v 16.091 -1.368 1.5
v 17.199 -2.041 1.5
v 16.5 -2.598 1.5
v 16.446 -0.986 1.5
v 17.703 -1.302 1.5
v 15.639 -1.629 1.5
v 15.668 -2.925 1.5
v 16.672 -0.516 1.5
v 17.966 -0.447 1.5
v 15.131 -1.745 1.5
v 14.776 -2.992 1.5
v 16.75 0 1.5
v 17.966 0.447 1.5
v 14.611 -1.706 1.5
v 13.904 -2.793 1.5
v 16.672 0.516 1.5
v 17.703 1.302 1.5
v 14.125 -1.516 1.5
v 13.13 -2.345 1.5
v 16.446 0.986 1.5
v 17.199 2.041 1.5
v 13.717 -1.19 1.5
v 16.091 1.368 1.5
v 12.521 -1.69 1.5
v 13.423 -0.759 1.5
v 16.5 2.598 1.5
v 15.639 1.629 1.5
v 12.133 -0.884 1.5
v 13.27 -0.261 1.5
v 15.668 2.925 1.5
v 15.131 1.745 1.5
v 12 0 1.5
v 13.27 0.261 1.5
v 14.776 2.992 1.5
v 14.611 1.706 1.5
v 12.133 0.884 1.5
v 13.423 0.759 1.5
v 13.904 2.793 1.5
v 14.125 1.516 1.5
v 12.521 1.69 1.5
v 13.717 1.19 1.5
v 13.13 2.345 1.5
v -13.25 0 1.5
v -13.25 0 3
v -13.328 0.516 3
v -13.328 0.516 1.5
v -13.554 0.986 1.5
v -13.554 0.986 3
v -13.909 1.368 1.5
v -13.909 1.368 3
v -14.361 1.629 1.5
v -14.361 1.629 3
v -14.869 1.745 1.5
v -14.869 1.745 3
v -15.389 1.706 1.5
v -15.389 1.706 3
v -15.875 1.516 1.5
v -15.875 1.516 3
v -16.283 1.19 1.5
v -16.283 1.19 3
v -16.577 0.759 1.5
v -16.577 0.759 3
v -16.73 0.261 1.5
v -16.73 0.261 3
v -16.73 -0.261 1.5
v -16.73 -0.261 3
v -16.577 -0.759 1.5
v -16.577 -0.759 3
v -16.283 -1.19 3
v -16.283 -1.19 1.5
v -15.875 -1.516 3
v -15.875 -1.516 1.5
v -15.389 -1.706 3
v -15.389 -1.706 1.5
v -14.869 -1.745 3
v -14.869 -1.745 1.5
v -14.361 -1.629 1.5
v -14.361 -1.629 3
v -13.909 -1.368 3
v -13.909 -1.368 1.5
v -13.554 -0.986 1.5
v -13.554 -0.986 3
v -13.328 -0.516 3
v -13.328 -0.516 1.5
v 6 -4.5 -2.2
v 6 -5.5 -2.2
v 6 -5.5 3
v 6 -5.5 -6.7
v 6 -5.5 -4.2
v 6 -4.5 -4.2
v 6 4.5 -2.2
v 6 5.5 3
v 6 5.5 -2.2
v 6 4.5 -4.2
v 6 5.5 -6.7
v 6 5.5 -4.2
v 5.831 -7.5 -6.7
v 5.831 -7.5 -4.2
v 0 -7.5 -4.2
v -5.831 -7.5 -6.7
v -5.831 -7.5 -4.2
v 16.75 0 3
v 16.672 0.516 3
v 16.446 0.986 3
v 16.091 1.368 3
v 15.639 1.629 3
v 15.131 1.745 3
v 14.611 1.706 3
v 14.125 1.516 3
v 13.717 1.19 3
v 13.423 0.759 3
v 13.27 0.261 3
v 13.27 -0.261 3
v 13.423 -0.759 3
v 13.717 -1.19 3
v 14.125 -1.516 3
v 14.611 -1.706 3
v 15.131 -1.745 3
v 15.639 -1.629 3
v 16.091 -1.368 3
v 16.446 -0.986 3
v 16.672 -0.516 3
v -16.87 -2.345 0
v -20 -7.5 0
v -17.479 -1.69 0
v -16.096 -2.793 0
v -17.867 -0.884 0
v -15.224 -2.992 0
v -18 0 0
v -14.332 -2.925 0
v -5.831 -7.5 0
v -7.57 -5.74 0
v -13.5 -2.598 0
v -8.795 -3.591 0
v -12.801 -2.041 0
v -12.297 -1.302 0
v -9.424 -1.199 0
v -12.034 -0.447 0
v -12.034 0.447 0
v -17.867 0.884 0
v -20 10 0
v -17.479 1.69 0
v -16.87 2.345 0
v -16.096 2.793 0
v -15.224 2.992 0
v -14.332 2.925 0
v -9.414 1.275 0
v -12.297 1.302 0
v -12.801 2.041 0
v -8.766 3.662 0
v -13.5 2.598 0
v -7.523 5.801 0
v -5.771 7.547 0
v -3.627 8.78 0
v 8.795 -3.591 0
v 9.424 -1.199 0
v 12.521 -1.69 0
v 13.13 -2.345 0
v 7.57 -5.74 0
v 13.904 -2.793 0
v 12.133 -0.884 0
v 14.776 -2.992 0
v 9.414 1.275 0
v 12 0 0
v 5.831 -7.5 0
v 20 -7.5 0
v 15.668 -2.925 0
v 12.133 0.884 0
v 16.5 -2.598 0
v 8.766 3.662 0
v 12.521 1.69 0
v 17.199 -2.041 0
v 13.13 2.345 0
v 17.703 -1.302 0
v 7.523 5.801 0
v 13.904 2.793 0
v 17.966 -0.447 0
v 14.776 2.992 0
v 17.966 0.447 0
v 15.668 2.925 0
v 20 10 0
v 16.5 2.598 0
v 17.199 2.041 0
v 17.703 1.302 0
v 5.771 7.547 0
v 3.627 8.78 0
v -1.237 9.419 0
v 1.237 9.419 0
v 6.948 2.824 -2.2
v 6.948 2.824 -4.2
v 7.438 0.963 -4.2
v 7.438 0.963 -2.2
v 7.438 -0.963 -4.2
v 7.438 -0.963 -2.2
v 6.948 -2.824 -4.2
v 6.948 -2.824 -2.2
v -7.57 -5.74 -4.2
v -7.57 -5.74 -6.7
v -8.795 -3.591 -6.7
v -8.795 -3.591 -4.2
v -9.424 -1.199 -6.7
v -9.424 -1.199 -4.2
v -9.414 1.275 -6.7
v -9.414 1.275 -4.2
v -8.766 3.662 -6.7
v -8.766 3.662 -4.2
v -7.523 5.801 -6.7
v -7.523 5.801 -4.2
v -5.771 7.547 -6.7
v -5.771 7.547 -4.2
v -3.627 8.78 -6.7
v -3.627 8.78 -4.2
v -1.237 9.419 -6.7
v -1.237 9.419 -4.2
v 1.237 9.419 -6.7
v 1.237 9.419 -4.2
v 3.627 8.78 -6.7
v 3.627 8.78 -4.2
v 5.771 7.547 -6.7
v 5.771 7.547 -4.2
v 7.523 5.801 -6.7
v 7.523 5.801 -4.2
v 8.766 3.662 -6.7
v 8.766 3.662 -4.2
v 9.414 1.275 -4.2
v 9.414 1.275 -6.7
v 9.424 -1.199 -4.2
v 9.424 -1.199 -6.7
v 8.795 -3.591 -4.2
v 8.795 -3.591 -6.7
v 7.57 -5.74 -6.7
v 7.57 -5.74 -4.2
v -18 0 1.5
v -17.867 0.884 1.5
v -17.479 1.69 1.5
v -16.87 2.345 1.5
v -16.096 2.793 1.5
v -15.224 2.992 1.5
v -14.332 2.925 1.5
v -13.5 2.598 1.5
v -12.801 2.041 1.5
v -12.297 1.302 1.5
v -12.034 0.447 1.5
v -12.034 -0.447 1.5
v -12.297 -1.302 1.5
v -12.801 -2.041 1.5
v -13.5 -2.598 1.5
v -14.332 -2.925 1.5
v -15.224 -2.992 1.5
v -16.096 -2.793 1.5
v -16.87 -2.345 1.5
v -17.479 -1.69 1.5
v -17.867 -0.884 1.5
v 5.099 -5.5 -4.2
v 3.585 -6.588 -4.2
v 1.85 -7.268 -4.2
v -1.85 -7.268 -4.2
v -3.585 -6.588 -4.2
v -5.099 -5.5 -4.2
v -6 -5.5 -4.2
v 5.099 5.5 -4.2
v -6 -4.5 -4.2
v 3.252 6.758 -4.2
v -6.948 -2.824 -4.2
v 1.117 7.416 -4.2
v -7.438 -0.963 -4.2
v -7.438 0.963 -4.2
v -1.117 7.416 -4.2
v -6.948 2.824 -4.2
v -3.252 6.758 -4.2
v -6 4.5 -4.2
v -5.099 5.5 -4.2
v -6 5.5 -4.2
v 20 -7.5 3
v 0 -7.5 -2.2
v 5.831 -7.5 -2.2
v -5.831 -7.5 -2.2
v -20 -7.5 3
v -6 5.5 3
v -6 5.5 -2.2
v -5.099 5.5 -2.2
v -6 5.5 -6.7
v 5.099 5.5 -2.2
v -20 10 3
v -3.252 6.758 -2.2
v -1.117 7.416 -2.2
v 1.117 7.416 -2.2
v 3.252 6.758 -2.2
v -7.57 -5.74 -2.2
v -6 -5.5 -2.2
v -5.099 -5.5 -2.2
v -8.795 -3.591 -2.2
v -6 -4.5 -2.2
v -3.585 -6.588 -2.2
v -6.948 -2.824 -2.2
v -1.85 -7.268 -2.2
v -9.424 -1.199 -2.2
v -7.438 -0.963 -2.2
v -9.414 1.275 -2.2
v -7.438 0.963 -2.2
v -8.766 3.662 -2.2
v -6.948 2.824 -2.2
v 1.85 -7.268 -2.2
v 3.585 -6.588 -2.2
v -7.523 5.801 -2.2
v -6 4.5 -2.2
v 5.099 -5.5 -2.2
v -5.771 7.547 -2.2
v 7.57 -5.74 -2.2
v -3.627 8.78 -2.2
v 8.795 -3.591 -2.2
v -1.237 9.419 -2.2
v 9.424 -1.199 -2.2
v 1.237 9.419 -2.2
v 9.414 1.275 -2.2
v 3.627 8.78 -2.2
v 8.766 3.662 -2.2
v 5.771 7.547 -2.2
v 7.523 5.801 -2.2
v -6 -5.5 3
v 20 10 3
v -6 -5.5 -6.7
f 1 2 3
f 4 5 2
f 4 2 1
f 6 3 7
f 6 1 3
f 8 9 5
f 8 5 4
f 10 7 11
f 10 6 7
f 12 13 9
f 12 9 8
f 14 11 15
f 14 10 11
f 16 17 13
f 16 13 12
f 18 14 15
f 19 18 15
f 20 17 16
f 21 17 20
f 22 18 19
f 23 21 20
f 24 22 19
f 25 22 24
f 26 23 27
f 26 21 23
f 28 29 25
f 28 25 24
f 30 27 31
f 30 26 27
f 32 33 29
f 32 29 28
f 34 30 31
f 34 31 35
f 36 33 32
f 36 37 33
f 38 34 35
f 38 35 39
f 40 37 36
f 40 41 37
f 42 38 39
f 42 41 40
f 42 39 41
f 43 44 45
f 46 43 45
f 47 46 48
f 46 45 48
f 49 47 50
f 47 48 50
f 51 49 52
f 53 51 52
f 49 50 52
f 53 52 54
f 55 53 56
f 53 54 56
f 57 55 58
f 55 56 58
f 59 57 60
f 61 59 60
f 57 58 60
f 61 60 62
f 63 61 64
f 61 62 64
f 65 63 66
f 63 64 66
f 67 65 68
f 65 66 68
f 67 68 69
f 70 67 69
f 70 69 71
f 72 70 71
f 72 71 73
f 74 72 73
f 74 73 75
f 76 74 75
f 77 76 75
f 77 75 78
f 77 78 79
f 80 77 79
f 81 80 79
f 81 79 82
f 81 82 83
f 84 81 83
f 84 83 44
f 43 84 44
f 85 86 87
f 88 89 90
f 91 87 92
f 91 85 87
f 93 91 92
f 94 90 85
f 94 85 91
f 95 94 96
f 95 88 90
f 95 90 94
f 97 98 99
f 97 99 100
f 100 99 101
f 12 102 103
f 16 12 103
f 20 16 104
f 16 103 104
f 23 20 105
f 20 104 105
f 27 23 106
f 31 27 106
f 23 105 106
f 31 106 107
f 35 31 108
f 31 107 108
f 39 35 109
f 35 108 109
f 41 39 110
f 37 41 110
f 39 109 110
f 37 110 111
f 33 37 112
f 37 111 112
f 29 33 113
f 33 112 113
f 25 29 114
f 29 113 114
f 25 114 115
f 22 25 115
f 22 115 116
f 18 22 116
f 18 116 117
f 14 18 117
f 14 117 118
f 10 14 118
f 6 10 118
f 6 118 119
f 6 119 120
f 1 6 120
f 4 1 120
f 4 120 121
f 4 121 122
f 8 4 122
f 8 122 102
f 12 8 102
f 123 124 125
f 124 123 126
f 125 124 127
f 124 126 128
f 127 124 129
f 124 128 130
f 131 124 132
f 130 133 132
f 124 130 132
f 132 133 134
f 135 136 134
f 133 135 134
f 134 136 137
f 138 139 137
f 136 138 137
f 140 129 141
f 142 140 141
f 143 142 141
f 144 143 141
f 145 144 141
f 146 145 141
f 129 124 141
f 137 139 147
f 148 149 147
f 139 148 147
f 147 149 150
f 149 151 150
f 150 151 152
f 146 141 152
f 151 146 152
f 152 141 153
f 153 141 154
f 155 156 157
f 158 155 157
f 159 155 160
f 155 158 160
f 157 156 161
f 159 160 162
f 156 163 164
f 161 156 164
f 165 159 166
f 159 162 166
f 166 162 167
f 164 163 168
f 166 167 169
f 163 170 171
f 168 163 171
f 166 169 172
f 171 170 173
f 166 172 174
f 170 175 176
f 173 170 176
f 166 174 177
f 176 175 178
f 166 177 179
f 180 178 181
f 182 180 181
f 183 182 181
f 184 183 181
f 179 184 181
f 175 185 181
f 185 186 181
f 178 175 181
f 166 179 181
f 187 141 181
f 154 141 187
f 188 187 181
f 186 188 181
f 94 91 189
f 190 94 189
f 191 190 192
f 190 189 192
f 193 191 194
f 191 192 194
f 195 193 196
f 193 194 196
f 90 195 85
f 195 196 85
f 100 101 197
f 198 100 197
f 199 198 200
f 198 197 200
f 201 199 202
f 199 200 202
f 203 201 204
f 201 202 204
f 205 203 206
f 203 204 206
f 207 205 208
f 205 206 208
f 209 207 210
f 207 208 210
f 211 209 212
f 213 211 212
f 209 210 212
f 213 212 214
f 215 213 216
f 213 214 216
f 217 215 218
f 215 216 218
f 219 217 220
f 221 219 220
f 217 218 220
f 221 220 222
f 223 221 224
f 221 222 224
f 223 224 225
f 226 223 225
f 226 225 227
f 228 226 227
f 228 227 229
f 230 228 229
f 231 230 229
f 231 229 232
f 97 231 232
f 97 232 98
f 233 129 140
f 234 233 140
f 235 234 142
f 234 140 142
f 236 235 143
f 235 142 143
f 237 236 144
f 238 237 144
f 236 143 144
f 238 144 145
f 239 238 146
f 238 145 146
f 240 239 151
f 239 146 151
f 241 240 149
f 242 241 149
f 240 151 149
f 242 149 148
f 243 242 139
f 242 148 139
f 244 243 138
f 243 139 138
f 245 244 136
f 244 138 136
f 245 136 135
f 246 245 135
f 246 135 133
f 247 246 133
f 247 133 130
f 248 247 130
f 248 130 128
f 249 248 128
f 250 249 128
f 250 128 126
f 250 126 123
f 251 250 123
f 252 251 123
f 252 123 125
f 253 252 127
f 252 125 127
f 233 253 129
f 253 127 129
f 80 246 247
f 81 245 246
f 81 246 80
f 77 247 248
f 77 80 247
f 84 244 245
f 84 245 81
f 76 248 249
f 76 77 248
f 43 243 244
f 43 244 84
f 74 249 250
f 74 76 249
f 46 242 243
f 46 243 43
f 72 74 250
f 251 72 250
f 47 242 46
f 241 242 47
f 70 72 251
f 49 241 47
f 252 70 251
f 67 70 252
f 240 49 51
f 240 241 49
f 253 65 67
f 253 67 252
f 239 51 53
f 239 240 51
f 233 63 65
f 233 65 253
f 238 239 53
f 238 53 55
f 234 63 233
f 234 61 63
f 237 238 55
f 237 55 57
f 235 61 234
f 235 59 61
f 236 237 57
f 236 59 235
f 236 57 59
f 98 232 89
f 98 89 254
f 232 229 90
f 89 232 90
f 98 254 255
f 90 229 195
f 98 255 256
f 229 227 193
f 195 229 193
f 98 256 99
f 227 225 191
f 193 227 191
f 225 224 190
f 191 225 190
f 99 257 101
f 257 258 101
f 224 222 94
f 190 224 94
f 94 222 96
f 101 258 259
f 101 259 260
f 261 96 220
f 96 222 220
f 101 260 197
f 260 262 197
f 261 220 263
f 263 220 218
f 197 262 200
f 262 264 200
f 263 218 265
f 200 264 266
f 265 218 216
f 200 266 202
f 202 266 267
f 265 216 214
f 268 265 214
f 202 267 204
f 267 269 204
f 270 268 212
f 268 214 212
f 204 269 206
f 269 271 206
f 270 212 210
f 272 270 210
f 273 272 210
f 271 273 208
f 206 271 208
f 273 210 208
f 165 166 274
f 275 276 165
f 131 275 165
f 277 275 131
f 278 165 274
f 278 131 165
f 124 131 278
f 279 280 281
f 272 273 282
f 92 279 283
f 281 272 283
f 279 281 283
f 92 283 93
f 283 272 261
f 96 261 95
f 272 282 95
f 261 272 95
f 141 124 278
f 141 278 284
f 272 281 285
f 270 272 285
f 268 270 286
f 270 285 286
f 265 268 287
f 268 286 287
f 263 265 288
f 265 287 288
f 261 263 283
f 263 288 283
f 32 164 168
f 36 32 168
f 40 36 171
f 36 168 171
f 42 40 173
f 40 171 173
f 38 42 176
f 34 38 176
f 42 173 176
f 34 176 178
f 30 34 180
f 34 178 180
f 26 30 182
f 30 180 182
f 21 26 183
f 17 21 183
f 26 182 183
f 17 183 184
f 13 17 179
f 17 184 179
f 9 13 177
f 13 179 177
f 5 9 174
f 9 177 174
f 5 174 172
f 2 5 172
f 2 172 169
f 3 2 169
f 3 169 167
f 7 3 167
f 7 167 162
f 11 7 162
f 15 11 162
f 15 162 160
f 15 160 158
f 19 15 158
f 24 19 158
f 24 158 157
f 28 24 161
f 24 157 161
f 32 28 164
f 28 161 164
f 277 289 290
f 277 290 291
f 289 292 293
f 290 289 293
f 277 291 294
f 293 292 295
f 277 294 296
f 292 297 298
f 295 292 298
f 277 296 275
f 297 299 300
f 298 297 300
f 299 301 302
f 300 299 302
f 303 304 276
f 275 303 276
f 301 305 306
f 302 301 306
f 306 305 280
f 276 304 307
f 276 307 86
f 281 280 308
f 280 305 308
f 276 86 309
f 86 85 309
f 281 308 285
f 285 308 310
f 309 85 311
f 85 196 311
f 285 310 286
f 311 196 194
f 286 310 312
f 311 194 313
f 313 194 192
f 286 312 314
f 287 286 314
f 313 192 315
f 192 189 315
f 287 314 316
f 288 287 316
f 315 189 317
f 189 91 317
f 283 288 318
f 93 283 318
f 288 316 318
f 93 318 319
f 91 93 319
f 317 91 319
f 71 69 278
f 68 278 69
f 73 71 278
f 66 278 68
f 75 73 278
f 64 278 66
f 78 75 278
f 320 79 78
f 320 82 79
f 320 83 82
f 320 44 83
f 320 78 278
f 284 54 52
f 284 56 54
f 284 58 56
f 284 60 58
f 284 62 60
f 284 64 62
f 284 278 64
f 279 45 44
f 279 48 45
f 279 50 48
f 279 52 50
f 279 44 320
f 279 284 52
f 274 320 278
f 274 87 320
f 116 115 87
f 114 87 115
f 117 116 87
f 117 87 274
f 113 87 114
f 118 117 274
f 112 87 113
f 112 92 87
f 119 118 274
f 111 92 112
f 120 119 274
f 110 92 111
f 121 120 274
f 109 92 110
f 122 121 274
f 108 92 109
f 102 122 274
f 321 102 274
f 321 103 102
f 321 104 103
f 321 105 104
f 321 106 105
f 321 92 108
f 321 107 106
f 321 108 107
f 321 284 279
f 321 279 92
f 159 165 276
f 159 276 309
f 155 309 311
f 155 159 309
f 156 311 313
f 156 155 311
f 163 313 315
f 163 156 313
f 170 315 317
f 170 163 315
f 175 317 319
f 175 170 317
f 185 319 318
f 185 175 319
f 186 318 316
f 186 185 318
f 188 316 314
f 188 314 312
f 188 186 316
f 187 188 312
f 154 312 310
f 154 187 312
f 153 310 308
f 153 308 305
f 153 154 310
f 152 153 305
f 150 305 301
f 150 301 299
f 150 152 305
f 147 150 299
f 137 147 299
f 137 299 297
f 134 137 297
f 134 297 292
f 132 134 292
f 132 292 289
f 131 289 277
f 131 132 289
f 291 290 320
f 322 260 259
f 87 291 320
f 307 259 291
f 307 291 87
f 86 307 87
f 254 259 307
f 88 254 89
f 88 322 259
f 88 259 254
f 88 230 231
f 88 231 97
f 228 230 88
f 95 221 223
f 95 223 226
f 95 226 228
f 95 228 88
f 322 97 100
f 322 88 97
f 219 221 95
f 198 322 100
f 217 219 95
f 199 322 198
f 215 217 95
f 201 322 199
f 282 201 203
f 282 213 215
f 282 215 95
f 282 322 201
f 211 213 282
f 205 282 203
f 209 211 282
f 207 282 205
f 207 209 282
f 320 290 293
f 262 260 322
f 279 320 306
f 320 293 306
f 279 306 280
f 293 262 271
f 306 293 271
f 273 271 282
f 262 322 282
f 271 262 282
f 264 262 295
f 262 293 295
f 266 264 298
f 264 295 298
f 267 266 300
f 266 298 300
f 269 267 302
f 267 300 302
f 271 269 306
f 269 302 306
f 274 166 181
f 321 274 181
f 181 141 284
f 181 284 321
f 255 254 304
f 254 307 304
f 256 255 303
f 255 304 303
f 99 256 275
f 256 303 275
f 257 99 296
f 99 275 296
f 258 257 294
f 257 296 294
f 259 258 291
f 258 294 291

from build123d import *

# Parameters (mm, degrees)
BOSS_EXTRUDE1_DEPTH = 2.2
SKETCH3_R           = 7.5
BOSS_EXTRUDE2_DEPTH = 2
BOSS_EXTRUDE3_DEPTH = 2.5
SKETCH5_W           = 12
SKETCH5_H           = 11
CUT_EXTRUDE1_DEPTH  = 7.7
SKETCH6_W           = 40
SKETCH6_H           = 20
SKETCH6_W_2         = 12
SKETCH6_H_2         = 11
BOSS_EXTRUDE4_DEPTH = 3
SKETCH7_R           = 1.75
CUT_EXTRUDE2_DEPTH  = 10.7
SKETCH8_R           = 3
CUT_EXTRUDE3_DEPTH  = 1.5
SKETCH9_W           = 40
SKETCH9_H           = 2.5
CUT_EXTRUDE4_DEPTH  = 10.7


with BuildPart() as part:
    # Sketch2 → Boss-Extrude1 (new body)
    with BuildSketch(Plane.XY):
        with BuildLine():
            Line((-5.830951895, -7.5), (5.830951895, -7.5))
            ThreePointArc((5.830951895, -7.5), (0, 9.5), (-5.830951895, -7.5))
        make_face()
    extrude(amount=-BOSS_EXTRUDE1_DEPTH)

    # Sketch3 → Boss-Extrude2 (add)
    with BuildSketch(Plane(origin=(0, 0, -2.2), x_dir=(-1, 0, 0), z_dir=(0, 0, -1))):
        Circle(SKETCH3_R)
    extrude(amount=BOSS_EXTRUDE2_DEPTH)

    # Sketch4 → Boss-Extrude3 (add)
    with BuildSketch(Plane(origin=(0, 0, -4.2), x_dir=(-1, 0, 0), z_dir=(0, 0, -1))):
        with BuildLine():
            Line((-5.830951895, -7.5), (5.830951895, -7.5))
            ThreePointArc((5.830951895, -7.5), (0, 9.5), (-5.830951895, -7.5))
        make_face()
    extrude(amount=BOSS_EXTRUDE3_DEPTH)

    # Sketch5 → Cut-Extrude1 (cut, through all)
    with BuildSketch(Plane(origin=(0, 0, -6.7), x_dir=(-1, 0, 0), z_dir=(0, 0, -1))):
        Rectangle(SKETCH5_W, SKETCH5_H)
    extrude(amount=-CUT_EXTRUDE1_DEPTH, mode=Mode.SUBTRACT)

    # Sketch6 → Boss-Extrude4 (add)
    with BuildSketch(Plane.XY):
        Rectangle(SKETCH6_W, SKETCH6_H)
        Rectangle(SKETCH6_W_2, SKETCH6_H_2, mode=Mode.SUBTRACT)
    extrude(amount=BOSS_EXTRUDE4_DEPTH)

    # Sketch7 → Cut-Extrude2 (cut, through all)
    with BuildSketch(Plane.XY.offset(3)):
        with Locations((-15, 0)):
            Circle(SKETCH7_R)
        with Locations((15, 0)):
            Circle(SKETCH7_R)
    extrude(amount=-CUT_EXTRUDE2_DEPTH, mode=Mode.SUBTRACT)

    # Sketch8 → Cut-Extrude3 (cut)
    with BuildSketch(Plane(origin=(0, 0, 0), x_dir=(-1, 0, 0), z_dir=(0, 0, -1))):
        with Locations((15, 0)):
            Circle(SKETCH8_R)
        with Locations((-15, 0)):
            Circle(SKETCH8_R)
    extrude(amount=-CUT_EXTRUDE3_DEPTH, mode=Mode.SUBTRACT)

    # Sketch9 → Cut-Extrude4 (cut, through all)
    with BuildSketch(Plane(origin=(0, 0, -6.7), x_dir=(-1, 0, 0), z_dir=(0, 0, -1))):
        with Locations((0, -8.75)):
            Rectangle(SKETCH9_W, SKETCH9_H)
    extrude(amount=-CUT_EXTRUDE4_DEPTH, mode=Mode.SUBTRACT)


solid = part.part
